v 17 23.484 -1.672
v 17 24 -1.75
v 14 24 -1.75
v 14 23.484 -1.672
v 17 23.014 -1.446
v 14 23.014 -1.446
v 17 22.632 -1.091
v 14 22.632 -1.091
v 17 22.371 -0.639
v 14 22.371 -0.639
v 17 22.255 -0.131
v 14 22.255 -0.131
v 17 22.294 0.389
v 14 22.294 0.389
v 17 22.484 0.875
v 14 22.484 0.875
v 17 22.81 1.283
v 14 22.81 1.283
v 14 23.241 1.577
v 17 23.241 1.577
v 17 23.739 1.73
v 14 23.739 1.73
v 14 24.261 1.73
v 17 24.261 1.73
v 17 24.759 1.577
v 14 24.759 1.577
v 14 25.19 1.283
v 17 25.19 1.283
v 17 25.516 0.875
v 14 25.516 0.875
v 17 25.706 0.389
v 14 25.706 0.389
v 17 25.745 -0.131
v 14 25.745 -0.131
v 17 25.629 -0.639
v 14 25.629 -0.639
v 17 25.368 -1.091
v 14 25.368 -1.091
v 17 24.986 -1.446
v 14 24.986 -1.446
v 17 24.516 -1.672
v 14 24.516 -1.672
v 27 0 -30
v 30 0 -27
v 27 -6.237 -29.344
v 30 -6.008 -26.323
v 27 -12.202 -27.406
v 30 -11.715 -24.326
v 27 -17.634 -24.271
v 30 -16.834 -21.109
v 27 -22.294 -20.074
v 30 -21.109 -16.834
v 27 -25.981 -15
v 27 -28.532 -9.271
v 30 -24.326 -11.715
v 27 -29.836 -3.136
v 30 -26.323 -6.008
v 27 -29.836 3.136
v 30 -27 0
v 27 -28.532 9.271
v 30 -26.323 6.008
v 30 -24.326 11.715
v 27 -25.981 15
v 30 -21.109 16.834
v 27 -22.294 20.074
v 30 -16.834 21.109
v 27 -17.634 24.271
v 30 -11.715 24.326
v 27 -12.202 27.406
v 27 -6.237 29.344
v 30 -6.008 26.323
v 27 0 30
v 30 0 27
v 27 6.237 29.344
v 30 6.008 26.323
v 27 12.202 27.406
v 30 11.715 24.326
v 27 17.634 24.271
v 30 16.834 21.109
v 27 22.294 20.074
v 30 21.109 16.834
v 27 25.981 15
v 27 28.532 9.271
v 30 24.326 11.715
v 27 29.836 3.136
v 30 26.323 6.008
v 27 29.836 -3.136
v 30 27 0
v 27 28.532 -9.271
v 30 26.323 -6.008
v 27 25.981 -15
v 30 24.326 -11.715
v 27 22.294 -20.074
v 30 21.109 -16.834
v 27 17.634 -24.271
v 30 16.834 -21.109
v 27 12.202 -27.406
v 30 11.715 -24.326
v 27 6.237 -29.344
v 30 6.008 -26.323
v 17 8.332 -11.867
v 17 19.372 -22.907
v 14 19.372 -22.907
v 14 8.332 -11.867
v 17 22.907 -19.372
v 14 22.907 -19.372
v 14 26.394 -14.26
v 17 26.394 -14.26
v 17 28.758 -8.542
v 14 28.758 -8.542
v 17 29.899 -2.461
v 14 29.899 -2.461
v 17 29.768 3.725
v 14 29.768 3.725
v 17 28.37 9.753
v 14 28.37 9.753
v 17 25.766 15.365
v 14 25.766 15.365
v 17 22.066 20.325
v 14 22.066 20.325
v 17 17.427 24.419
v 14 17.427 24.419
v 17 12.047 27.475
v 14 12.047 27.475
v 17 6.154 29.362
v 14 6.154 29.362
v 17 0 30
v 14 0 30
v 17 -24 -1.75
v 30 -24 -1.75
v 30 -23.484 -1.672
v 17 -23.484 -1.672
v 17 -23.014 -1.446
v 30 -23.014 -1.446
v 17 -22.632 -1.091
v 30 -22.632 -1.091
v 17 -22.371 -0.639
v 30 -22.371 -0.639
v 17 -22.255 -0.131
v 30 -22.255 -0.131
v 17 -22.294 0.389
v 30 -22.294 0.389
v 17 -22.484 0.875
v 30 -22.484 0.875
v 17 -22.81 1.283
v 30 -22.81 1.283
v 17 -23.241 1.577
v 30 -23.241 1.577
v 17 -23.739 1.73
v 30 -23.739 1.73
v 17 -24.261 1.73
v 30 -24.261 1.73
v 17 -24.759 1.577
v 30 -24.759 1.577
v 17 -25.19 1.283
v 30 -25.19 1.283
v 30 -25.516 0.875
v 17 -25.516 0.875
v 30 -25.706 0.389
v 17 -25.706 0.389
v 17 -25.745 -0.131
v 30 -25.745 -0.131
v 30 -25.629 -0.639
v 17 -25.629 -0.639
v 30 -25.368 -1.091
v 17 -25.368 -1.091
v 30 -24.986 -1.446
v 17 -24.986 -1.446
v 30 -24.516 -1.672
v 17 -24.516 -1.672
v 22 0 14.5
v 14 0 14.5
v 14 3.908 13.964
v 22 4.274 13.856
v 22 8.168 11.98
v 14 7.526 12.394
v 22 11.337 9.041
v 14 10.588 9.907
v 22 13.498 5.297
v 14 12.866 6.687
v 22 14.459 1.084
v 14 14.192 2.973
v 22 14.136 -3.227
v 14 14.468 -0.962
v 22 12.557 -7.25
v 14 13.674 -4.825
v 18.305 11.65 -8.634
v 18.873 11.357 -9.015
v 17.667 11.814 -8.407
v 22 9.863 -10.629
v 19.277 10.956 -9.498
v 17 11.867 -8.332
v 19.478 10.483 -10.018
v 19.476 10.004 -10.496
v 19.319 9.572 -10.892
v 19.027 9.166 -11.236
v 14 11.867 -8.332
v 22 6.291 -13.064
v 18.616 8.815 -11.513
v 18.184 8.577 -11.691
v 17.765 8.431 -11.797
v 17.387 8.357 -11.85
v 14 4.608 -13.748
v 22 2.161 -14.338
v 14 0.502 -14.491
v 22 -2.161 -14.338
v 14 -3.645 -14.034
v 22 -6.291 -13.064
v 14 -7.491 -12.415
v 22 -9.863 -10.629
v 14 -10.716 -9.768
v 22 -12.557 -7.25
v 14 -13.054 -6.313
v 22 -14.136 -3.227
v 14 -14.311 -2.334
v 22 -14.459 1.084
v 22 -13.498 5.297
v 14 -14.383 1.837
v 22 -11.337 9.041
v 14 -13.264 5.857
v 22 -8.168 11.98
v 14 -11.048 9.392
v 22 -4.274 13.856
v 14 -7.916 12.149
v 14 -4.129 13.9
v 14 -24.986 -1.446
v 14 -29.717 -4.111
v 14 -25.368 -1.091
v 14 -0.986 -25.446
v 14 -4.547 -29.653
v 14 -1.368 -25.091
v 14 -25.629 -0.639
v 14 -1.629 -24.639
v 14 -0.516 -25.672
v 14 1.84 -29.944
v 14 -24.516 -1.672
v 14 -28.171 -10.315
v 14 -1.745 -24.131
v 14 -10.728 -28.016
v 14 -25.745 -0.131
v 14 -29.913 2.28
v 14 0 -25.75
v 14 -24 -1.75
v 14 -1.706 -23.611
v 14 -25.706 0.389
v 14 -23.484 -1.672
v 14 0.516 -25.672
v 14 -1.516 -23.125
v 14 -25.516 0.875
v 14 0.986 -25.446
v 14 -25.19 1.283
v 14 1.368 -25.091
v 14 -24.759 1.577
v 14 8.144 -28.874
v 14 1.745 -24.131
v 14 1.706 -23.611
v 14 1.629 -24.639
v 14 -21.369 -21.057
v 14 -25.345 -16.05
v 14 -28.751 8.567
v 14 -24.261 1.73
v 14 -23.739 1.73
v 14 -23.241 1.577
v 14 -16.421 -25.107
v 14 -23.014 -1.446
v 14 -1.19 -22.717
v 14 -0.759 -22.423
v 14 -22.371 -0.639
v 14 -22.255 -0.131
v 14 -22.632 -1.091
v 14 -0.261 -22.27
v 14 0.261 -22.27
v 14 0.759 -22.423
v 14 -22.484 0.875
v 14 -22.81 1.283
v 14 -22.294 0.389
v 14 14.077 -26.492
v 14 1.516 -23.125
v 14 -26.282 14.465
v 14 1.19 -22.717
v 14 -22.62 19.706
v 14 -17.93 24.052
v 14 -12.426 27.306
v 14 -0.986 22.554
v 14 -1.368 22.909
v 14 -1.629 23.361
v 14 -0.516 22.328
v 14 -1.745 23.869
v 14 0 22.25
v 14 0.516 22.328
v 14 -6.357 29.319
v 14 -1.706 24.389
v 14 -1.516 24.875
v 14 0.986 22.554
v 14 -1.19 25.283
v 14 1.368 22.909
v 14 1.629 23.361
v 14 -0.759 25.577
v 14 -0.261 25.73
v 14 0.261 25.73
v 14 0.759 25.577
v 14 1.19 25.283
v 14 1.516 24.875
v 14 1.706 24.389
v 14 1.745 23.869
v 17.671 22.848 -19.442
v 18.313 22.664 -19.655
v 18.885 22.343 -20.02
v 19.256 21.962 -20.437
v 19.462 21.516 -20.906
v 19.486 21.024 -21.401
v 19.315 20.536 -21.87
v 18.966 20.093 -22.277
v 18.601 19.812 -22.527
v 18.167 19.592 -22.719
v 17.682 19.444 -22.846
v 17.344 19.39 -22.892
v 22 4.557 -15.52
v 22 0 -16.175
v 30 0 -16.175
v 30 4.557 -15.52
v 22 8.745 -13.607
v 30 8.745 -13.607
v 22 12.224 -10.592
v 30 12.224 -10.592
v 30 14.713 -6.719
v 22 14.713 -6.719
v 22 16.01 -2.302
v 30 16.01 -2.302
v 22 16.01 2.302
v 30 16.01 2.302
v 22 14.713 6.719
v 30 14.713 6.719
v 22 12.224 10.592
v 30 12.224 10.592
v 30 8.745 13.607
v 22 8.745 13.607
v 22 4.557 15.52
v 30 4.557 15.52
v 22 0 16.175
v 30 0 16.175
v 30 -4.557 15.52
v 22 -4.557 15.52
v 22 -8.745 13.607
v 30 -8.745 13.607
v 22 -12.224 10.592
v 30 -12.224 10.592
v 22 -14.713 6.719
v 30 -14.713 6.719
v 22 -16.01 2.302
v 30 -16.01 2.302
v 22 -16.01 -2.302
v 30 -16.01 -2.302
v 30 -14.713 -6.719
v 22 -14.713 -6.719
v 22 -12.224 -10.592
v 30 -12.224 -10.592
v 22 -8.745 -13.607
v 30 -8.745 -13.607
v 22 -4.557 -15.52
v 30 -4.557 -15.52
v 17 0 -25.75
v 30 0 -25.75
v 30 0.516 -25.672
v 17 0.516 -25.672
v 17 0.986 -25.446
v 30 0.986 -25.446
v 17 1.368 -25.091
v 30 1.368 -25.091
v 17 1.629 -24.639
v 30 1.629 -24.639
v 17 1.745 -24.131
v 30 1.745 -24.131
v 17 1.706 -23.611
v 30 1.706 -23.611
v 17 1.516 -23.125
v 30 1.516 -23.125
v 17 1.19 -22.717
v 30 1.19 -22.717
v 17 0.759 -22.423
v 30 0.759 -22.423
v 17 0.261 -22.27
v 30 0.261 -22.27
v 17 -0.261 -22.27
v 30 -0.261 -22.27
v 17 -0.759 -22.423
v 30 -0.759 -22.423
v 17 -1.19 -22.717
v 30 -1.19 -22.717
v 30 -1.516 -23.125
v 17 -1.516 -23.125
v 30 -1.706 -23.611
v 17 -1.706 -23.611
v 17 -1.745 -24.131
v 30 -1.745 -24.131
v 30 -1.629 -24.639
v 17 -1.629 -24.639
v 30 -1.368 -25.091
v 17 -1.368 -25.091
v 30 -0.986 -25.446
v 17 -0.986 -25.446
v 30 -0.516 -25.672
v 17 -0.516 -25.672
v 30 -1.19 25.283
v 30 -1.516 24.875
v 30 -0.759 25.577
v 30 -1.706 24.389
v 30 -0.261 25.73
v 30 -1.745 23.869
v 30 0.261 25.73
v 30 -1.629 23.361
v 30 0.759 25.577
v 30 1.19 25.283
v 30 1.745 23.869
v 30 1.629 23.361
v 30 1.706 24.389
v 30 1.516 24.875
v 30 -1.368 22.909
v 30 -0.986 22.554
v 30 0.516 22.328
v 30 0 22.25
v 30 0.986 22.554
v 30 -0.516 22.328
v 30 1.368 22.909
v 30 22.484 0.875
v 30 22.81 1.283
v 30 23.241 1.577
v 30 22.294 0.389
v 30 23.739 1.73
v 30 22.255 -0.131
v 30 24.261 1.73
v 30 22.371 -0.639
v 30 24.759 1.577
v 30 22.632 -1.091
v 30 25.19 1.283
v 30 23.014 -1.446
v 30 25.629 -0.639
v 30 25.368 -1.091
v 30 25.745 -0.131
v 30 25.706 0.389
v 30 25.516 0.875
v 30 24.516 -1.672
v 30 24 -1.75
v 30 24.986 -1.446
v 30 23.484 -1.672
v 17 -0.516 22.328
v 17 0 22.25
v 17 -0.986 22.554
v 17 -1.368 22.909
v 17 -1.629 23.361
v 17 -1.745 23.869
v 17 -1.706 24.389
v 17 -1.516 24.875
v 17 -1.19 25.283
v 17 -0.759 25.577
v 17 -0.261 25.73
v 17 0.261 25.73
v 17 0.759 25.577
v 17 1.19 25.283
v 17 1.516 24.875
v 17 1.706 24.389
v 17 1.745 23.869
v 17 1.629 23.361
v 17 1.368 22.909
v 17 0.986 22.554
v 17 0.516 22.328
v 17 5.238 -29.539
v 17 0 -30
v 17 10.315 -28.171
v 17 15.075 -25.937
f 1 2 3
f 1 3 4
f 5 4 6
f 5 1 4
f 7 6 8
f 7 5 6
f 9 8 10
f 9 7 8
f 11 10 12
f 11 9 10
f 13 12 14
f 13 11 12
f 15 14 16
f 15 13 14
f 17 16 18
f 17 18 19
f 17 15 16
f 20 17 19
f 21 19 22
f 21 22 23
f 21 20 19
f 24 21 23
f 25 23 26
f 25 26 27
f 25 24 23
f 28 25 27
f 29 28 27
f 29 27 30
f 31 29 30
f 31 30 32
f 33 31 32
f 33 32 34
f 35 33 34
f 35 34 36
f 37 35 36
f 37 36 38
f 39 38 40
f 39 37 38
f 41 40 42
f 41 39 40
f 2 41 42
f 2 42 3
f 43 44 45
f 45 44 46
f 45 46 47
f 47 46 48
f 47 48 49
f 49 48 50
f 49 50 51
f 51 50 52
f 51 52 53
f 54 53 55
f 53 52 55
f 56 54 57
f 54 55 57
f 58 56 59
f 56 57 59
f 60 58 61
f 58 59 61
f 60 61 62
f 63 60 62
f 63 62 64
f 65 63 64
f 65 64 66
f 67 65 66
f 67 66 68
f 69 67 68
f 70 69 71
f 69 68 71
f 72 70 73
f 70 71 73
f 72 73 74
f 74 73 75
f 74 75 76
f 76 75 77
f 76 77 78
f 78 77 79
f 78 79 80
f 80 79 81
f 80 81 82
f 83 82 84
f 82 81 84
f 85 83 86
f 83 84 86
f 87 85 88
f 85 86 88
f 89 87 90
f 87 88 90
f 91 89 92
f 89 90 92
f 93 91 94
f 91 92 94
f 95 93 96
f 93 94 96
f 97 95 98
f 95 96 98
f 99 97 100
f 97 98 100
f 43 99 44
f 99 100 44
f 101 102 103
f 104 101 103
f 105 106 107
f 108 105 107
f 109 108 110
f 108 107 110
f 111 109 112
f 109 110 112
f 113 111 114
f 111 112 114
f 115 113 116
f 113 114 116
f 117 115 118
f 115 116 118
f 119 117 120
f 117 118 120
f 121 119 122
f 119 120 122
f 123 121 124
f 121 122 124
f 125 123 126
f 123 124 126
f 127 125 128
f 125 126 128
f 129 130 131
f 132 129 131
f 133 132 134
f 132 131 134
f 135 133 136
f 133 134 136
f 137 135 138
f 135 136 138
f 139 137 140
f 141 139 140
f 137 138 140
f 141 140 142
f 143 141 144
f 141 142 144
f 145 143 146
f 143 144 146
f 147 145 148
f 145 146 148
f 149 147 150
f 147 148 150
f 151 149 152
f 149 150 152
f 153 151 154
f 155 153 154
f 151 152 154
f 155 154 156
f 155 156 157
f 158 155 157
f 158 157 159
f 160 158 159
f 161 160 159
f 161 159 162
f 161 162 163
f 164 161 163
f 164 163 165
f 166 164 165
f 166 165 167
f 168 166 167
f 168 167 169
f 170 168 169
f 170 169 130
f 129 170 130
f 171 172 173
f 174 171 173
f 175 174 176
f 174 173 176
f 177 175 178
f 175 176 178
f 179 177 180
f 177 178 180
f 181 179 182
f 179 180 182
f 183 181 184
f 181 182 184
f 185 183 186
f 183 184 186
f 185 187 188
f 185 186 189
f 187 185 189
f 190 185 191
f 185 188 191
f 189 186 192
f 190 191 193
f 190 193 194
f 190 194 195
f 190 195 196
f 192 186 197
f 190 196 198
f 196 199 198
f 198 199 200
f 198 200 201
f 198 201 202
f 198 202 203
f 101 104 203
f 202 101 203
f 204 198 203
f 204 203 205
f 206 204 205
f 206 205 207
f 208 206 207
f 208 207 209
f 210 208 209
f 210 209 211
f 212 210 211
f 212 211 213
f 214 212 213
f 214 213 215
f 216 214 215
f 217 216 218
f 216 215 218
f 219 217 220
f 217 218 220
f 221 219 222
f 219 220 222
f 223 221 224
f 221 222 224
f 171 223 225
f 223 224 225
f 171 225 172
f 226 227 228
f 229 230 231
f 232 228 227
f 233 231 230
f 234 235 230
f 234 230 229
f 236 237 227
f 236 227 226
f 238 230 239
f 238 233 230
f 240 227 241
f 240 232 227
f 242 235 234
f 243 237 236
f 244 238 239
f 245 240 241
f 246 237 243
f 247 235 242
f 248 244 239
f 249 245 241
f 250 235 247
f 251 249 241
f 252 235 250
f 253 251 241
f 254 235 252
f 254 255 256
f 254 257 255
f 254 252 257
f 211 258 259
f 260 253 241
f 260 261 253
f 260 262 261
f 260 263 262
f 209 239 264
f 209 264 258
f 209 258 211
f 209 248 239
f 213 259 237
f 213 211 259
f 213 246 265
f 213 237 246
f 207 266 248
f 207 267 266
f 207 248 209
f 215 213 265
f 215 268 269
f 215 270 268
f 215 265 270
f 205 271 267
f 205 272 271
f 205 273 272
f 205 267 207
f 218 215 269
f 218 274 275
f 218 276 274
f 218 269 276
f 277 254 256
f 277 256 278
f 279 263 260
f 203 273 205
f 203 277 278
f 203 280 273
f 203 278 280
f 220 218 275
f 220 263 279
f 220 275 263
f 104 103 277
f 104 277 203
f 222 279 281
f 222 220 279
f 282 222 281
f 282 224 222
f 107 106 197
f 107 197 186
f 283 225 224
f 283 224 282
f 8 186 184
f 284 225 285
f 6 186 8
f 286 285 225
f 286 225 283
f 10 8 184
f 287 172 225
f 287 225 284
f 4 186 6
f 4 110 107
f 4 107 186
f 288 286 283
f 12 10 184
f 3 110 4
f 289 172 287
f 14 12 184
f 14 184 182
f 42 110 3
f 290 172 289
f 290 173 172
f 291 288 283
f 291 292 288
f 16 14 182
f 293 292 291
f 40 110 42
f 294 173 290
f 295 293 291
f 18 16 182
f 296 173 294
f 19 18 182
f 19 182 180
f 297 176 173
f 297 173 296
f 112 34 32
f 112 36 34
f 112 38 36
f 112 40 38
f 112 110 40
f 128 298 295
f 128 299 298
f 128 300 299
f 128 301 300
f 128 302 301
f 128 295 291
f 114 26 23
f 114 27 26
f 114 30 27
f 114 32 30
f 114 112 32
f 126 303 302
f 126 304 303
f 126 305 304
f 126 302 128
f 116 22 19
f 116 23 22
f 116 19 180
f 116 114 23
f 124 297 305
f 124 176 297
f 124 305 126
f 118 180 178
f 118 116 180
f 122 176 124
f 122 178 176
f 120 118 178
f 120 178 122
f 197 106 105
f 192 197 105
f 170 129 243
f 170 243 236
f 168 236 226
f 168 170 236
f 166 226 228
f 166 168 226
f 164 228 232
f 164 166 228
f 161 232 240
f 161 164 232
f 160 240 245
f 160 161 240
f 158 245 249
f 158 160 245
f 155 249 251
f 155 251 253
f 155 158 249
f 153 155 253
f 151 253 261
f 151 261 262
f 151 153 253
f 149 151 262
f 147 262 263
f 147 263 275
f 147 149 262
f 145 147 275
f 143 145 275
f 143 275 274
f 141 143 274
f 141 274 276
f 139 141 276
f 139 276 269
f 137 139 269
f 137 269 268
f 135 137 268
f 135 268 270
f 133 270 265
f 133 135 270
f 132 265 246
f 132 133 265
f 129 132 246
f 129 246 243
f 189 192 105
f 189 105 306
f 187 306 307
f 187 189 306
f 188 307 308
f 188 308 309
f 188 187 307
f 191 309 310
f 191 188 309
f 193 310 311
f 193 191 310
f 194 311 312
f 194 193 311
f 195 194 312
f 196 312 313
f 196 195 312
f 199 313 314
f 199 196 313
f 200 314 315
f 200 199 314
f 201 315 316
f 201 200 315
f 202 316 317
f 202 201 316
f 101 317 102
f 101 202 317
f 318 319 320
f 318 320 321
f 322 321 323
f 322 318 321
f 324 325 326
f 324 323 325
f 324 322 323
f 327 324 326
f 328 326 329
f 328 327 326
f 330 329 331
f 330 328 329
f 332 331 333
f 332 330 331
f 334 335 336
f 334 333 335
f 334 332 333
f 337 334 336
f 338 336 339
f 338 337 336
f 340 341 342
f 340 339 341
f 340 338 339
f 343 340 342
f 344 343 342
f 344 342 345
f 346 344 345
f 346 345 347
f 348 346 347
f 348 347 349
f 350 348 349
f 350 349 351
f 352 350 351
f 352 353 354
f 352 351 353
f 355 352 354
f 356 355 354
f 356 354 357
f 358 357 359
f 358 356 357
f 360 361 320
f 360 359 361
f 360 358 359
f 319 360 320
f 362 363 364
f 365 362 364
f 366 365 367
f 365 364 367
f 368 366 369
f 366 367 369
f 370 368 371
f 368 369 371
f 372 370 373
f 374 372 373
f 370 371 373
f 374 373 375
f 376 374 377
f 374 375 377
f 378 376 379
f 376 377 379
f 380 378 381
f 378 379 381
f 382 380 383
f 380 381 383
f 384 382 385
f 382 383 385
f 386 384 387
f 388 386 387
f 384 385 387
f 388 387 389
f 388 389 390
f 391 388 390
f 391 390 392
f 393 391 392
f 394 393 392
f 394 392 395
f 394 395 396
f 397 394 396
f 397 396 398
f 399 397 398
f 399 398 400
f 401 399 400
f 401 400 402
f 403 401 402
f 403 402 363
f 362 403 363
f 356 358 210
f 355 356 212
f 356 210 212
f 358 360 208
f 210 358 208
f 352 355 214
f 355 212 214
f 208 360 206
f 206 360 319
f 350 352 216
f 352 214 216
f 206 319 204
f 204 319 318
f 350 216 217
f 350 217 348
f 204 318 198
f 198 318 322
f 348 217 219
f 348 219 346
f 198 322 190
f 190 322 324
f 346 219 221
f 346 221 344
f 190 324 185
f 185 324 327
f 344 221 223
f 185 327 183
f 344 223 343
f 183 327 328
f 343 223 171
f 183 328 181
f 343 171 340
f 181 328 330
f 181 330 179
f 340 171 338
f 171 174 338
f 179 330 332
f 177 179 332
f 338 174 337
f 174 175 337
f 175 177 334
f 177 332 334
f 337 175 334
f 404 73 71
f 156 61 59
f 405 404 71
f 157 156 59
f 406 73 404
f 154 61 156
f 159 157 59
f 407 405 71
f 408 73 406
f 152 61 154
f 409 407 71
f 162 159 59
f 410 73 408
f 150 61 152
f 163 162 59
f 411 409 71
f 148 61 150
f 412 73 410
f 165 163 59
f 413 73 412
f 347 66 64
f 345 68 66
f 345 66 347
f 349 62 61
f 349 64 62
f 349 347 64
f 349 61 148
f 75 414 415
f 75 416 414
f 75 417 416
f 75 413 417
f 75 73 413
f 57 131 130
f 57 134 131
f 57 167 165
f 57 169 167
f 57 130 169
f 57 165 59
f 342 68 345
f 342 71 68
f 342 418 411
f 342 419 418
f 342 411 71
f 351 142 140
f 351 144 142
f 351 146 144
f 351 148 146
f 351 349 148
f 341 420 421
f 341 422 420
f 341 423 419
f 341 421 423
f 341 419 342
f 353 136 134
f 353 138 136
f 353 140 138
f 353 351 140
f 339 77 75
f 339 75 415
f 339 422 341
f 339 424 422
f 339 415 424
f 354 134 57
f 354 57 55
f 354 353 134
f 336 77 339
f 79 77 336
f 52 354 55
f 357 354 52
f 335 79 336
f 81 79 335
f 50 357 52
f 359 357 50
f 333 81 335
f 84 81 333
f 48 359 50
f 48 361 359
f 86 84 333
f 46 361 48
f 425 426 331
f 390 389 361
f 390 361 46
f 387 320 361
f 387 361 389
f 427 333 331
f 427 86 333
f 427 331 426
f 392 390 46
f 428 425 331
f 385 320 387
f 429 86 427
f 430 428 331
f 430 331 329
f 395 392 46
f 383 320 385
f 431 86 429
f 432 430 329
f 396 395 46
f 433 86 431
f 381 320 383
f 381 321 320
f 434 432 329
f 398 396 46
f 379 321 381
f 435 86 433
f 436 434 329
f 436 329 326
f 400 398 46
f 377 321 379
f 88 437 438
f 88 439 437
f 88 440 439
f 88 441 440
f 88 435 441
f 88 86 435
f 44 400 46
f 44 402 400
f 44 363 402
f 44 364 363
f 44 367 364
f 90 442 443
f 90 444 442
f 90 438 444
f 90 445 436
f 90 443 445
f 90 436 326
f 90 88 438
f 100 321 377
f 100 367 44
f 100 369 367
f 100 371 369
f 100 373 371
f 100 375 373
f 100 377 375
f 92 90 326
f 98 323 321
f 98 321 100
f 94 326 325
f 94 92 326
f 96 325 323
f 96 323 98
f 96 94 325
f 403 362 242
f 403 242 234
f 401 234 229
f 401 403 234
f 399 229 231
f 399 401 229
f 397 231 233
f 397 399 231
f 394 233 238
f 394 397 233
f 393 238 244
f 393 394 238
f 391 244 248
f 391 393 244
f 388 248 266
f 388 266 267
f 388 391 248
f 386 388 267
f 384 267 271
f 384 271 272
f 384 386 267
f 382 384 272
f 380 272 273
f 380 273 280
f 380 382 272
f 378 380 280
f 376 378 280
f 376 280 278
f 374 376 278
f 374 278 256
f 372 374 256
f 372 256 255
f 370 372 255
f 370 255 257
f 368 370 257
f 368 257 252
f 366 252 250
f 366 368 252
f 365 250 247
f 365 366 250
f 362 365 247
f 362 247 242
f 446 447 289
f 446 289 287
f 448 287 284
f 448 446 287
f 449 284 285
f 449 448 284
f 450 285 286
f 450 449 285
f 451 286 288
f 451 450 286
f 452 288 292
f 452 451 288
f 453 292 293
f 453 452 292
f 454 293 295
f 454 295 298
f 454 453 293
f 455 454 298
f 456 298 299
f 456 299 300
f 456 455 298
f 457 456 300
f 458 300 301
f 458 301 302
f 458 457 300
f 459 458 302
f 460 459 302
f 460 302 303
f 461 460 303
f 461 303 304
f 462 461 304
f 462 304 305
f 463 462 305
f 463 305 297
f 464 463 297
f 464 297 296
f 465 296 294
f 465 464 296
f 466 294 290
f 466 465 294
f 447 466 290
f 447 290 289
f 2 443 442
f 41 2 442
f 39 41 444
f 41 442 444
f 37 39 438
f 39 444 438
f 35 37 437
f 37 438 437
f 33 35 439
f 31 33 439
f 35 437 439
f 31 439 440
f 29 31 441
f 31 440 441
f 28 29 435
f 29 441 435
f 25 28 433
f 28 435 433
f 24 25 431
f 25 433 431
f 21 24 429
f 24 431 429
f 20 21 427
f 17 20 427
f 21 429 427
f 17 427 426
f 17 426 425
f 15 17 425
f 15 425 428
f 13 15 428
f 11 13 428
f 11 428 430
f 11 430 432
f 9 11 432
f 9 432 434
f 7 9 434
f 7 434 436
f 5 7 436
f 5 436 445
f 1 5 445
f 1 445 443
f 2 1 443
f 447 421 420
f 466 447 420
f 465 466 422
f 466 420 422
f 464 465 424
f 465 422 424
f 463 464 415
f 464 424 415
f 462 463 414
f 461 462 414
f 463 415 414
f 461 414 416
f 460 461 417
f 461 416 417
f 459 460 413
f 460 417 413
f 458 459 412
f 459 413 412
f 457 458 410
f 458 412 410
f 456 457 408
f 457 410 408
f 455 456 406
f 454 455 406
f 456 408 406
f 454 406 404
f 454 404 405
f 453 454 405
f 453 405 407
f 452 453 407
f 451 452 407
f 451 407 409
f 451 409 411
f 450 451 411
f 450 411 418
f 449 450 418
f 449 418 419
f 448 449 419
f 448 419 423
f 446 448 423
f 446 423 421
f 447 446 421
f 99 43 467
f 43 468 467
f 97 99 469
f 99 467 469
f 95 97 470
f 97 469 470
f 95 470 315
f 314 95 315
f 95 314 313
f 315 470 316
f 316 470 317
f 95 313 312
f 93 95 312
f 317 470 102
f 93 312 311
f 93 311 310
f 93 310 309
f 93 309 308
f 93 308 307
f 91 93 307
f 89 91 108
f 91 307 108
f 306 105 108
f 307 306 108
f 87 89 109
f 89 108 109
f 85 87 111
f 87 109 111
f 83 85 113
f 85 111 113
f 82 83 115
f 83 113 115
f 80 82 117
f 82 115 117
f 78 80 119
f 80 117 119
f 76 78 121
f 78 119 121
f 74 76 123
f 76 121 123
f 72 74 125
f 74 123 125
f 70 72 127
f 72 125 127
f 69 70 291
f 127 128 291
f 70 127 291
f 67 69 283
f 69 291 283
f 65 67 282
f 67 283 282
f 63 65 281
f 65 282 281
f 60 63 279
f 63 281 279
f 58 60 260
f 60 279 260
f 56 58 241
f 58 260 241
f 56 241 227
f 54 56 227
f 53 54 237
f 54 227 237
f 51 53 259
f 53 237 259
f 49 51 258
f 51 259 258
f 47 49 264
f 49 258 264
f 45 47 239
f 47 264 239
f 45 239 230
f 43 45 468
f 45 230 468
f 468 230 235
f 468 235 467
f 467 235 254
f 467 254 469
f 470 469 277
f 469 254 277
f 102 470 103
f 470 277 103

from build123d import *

# Parameters (mm, degrees)
SKETCH_1_R           = 32
SKETCH_1_R_2         = 3
EXTRUDE_1_DEPTH      = 5
SKETCH_2_R           = 30
SKETCH_2_R_2         = 16.175
EXTRUDE_2_DEPTH      = 35
SKETCH_4_R           = 17
SKETCH_4_R_2         = 14
EXTRUDE_4_DEPTH      = 5
SKETCH_8_R           = 1.5
CUT_EXTRUDE_1_DEPTH  = 10
EXTRUDE_START        = 2
SKETCH_13_R          = 3.16745637
SKETCH_13_R_2        = 3
EXTRUDE_5_DEPTH      = 2
SKETCH_14_R          = 34.626760645
CUT_EXTRUDE_5_DEPTH  = 10
SKETCH_17_R          = 1.75
CUT_EXTRUDE_7_DEPTH  = 25
SKETCH_18_R          = 32
CUT_EXTRUDE_8_DEPTH  = 17
SKETCH_19_R          = 16.3
SKETCH_19_R_2        = 14.5
EXTRUDE_6_DEPTH      = 5
EXTRUDE_START_2      = 3
SKETCH_22_R          = 16.5
SKETCH_22_R_2        = 14.5
EXTRUDE_7_DEPTH      = 3
SKETCH_23_R          = 30
SKETCH_23_R_2        = 16.5
SKETCH_23_R_3        = 1.75
EXTRUDE_8_DEPTH      = 3
CHAMFER_2_SIZE       = 3
CUT_EXTRUDE_12_DEPTH = 52.961524227


with BuildPart() as part:
    # Эскиз1 → Бобышка-Вытянуть1 (new body)
    with BuildSketch(Plane(origin=(0, 0, 0), x_dir=(0, 0, -1), z_dir=(1, 0, 0))):
        Circle(SKETCH_1_R)
        with Locations((-24, 9)):
            Circle(SKETCH_1_R_2, mode=Mode.SUBTRACT)
        with Locations((-24, -9)):
            Circle(SKETCH_1_R_2, mode=Mode.SUBTRACT)
        with BuildLine():
            ThreePointArc((6.265686517, 10.234313483), (-12, 0), (6.265686517, -10.234313483))
            ThreePointArc((6.265686517, -10.234313483), (11.121320344, -11.121320344), (10.234313483, -6.265686517))
            ThreePointArc((10.234313483, -6.265686517), (12, 0), (10.234313483, 6.265686517))
            ThreePointArc((10.234313483, 6.265686517), (11.121320344, 11.121320344), (6.265686517, 10.234313483))
        make_face(mode=Mode.SUBTRACT)
    extrude(amount=EXTRUDE_1_DEPTH)

    # Эскиз2 → Бобышка-Вытянуть2 (add)
    with BuildSketch(Plane(origin=(5, 0, 0), x_dir=(0, 0, -1), z_dir=(1, 0, 0))):
        Circle(SKETCH_2_R)
        Circle(SKETCH_2_R_2, mode=Mode.SUBTRACT)
    extrude(amount=EXTRUDE_2_DEPTH)

    # Эскиз4 → Бобышка-Вытянуть4 (add)
    with BuildSketch(Plane(origin=(5, 0, 0), x_dir=(0, 0, -1), z_dir=(1, 0, 0))):
        Circle(SKETCH_4_R)
        with Locations(Location((0, 0, 0), (0, 0, 56.681914386))):
            Circle(SKETCH_4_R_2, mode=Mode.SUBTRACT)
    extrude(amount=EXTRUDE_4_DEPTH)

    # Эскиз8 → Вырез-Вытянуть1 (cut)
    with BuildSketch(Plane(origin=(5, 0, 0), x_dir=(0, 0, -1), z_dir=(1, 0, 0))):
        with Locations((-18, -20)):
            Circle(SKETCH_8_R)
        with Locations((18, -20)):
            Circle(SKETCH_8_R)
        with Locations((18, 20)):
            Circle(SKETCH_8_R)
        with Locations((-18, 20)):
            Circle(SKETCH_8_R)
    extrude(amount=-CUT_EXTRUDE_1_DEPTH, mode=Mode.SUBTRACT)

    # Эскиз13 → Бобышка-Вытянуть5 (add)
    with BuildSketch(Plane.ZY.offset(-5).offset(EXTRUDE_START)):
        with Locations((24, 9)):
            Circle(SKETCH_13_R)
        with Locations((24, -9)):
            Circle(SKETCH_13_R_2)
        with BuildLine():
            ThreePointArc((-6.121303477, 10.321319864), (-11.239729878, 11.239729878), (-10.321319864, 6.121303477))
            ThreePointArc((-10.321319864, 6.121303477), (-8.485281374, 8.485281374), (-6.121303477, 10.321319864))
        make_face()
        with BuildLine():
            ThreePointArc((-10.321319864, -6.121303477), (-11.239729878, -11.239729878), (-6.121303477, -10.321319864))
            ThreePointArc((-6.121303477, -10.321319864), (-8.485281374, -8.485281374), (-10.321319864, -6.121303477))
        make_face()
    extrude(amount=-EXTRUDE_5_DEPTH)

    # Эскиз14 → Вырез-Вытянуть5 (cut)
    with BuildSketch(Plane(origin=(40, 0, 0), x_dir=(0, 0, -1), z_dir=(1, 0, 0))):
        Circle(SKETCH_14_R)
    extrude(amount=-CUT_EXTRUDE_5_DEPTH, mode=Mode.SUBTRACT)

    # Эскиз17 → Вырез-Вытянуть7 (cut)
    with BuildSketch(Plane(origin=(30, 0, 0), x_dir=(0, 0, -1), z_dir=(1, 0, 0))):
        with Locations((-24, 0)):
            Circle(SKETCH_17_R)
        with Locations((0, 24)):
            Circle(SKETCH_17_R)
        with Locations((24, 0)):
            Circle(SKETCH_17_R)
        with Locations((0, -24)):
            Circle(SKETCH_17_R)
    extrude(amount=-CUT_EXTRUDE_7_DEPTH, mode=Mode.SUBTRACT)

    # Эскиз18 → Вырез-Вытянуть8 (cut)
    with BuildSketch(Plane.ZY):
        Circle(SKETCH_18_R)
    extrude(amount=-CUT_EXTRUDE_8_DEPTH, mode=Mode.SUBTRACT)

    # Эскиз19 → Бобышка-Вытянуть6 (add)
    with BuildSketch(Plane.ZY.offset(-17)):
        Circle(SKETCH_19_R)
        Circle(SKETCH_19_R_2, mode=Mode.SUBTRACT)
    extrude(amount=-EXTRUDE_6_DEPTH)

    # Эскиз22 → Бобышка-Вытянуть7 (add)
    with BuildSketch(Plane.ZY.offset(-17).offset(EXTRUDE_START_2)):
        Circle(SKETCH_22_R)
        Circle(SKETCH_22_R_2, mode=Mode.SUBTRACT)
    extrude(amount=-EXTRUDE_7_DEPTH)

    # Эскиз23 → Бобышка-Вытянуть8 (add)
    with BuildSketch(Plane.ZY.offset(-17)):
        Circle(SKETCH_23_R)
        Circle(SKETCH_23_R_2, mode=Mode.SUBTRACT)
        with Locations(Location((-24, 0, 0), (0, 0, 180))):
            Circle(SKETCH_23_R_3, mode=Mode.SUBTRACT)
        with Locations(Location((0, 24, 0), (0, 0, 180))):
            Circle(SKETCH_23_R_3, mode=Mode.SUBTRACT)
        with Locations(Location((24, 0, 0), (0, 0, 180))):
            Circle(SKETCH_23_R_3, mode=Mode.SUBTRACT)
        with Locations(Location((0, -24, 0), (0, 0, 180))):
            Circle(SKETCH_23_R_3, mode=Mode.SUBTRACT)
    extrude(amount=EXTRUDE_8_DEPTH)

    # Фаска2
    chamfer_2_edges = [part.edges().sort_by_distance(p)[0] for p in [
        (30, 0, 30),
    ]]
    chamfer(chamfer_2_edges, length=CHAMFER_2_SIZE)

    # Эскиз26 → Вырез-Вытянуть12 (cut, through all)
    with BuildSketch(Plane(origin=(0, 0, 0), x_dir=(1, 0, 0), z_dir=(0, -0.7071067811865437, 0.7071067811865513))):
        with BuildLine():
            Line((12, 2.5), (17, 2.5))
            ThreePointArc((17, 2.5), (19.5, 0), (17, -2.5))
            Line((17, -2.5), (12, -2.5))
            Line((12, -2.5), (12, 2.5))
        make_face()
    extrude(amount=-CUT_EXTRUDE_12_DEPTH, mode=Mode.SUBTRACT)


solid = part.part
